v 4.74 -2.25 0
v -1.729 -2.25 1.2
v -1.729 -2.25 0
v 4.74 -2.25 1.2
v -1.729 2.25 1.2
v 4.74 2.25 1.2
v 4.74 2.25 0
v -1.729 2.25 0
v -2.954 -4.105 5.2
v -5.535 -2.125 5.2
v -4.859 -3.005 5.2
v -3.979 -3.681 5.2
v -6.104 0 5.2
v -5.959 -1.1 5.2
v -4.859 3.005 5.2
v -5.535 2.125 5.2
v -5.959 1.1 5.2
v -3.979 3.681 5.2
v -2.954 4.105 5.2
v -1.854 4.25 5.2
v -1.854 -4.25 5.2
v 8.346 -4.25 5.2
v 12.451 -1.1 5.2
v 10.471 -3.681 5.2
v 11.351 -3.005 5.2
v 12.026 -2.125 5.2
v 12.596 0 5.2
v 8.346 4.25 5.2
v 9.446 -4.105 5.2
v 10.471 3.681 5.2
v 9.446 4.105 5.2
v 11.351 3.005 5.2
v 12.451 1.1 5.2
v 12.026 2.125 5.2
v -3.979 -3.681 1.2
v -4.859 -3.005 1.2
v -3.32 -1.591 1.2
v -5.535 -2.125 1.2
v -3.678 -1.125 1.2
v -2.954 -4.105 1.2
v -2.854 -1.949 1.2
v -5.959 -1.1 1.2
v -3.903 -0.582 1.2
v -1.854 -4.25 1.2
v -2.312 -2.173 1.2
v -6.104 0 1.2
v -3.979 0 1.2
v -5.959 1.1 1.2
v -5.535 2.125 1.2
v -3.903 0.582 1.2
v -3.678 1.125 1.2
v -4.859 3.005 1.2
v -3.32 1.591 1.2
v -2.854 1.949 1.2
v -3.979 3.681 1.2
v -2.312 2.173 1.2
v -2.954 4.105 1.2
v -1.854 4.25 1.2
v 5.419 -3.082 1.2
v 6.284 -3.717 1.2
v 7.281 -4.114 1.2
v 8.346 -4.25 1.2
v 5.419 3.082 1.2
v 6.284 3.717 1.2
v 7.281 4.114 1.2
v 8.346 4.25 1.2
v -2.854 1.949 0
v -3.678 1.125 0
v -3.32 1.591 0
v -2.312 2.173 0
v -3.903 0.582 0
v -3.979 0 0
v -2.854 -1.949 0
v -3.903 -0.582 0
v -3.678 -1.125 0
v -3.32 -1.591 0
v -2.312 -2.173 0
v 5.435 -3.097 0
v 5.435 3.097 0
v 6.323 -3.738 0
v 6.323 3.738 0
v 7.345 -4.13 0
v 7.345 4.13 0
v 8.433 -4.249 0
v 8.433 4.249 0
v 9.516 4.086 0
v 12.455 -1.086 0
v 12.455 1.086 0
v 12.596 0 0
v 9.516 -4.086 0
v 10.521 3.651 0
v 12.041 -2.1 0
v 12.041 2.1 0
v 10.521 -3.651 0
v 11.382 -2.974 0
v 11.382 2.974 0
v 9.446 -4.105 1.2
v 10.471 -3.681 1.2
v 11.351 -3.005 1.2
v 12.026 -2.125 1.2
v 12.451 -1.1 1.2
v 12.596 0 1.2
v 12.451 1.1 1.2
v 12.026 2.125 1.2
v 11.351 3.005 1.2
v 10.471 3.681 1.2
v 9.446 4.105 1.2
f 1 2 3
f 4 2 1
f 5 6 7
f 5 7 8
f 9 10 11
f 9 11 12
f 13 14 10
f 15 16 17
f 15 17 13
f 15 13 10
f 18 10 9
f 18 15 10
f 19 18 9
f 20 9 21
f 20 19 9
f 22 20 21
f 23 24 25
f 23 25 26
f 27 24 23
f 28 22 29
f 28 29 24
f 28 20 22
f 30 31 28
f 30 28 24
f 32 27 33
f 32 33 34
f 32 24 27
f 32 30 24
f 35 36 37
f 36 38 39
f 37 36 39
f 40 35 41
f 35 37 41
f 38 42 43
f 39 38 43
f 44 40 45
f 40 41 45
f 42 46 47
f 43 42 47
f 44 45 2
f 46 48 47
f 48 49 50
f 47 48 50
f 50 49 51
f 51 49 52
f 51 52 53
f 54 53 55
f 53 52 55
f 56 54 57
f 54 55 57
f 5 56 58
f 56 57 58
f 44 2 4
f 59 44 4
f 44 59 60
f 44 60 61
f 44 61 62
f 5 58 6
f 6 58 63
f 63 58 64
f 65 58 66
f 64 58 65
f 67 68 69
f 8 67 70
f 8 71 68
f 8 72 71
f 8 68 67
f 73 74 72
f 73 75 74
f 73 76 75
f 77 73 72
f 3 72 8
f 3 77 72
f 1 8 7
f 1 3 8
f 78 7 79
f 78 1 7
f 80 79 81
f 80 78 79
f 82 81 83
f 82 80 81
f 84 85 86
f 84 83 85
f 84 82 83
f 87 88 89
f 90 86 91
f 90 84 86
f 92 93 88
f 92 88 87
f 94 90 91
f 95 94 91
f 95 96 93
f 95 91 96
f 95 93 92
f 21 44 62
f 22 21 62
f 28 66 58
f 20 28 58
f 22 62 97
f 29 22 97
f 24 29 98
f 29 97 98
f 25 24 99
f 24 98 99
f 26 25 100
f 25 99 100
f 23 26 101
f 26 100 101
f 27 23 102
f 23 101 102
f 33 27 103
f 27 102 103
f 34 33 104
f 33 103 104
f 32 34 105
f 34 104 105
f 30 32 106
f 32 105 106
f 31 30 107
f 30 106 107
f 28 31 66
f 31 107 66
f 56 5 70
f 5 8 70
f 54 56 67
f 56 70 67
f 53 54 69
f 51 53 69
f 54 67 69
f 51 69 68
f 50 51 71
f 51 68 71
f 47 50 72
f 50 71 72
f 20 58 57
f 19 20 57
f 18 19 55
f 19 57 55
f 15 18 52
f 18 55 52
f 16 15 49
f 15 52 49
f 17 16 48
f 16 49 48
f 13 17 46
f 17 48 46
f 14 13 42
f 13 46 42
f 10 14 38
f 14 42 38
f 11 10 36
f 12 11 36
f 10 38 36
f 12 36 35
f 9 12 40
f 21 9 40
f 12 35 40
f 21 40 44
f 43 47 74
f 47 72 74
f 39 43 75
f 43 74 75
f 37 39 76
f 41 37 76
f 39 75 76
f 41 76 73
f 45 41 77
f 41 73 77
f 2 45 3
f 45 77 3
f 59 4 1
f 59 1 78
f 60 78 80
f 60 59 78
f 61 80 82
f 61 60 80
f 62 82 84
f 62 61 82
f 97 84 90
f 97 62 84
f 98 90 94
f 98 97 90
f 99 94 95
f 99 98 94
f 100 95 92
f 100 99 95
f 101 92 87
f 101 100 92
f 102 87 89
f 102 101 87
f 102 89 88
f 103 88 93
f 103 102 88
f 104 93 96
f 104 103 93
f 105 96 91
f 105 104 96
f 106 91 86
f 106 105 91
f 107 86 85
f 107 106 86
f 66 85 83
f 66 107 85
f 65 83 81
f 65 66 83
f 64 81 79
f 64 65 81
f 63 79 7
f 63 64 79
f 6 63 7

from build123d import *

# Parameters (mm, degrees)
F6_W      = 19.1
F6_H      = 8.9
F7_DEPTH  = 1.2
F10_DEPTH = 1.2
F11_R     = 2.24999
F12_W     = 19.1
F12_H     = 8.9
F13_DEPTH = 4.2
F14_DEPTH = 4
F15_W     = 19.1
F15_H     = 8.9
F16_DEPTH = 5.2


# Not quite as in the source:
# - a fillet or chamfer is up to 0.001 mm smaller than in the source, because OpenCascade refuses the exact size


with BuildPart() as f7:
    # F6 (on Top) → F7 (new body, through all)
    with BuildSketch(Plane.XY):
        with Locations((3.24578159, 0)):
            Rectangle(F6_W, F6_H)
    extrude(amount=F7_DEPTH)

    # F8 (on face) → F10 (cut, through all)
    with BuildSketch(Plane.XY.offset(1.2)):
        with BuildLine():
            Line((4.7402303145, 2.25), (-3.97921841, 2.25))
            Line((-3.97921841, 2.25), (-3.97921841, -2.25))
            Line((-3.97921841, -2.25), (4.7402303145, -2.25))
            ThreePointArc((4.7402303145, -2.25), (4.09578159, 0), (4.7402303145, 2.25))
        make_face()
        with BuildLine():
            ThreePointArc((12.59578159, 0), (9.5160181215, 4.0857124789), (4.7402303145, 2.25))
            ThreePointArc((4.7402303145, 2.25), (4.09578159, 0), (4.7402303145, -2.25))
            ThreePointArc((4.7402303145, -2.25), (9.5160181215, -4.0857124789), (12.59578159, 0))
        make_face()
    extrude(amount=-F10_DEPTH, mode=Mode.SUBTRACT)

    # F11 (radius 2.25 in the source; OpenCascade refuses exactly that, so slightly less here)
    f11_edges = [f7.edges().sort_by_distance(p)[0] for p in [
        (-3.979218, 2.25, 0.6),
        (-3.979218, -2.25, 0.6),
    ]]
    fillet(f11_edges, radius=F11_R)

    # F12 (on face) → F13 (join)
    with BuildSketch(Plane.XY.offset(1.2)):
        with Locations((3.24578159, 0)):
            Rectangle(F12_W, F12_H)
    extrude(amount=F13_DEPTH)

    # F9 (on offset) → F14 (cut, through all)
    with BuildSketch(Plane.XY.offset(1.2)):
        with BuildLine():
            Line((-1.85421841, -4.25), (8.34578159, -4.25))
            ThreePointArc((8.34578159, -4.25), (12.59578159, 0), (8.34578159, 4.25))
            Line((8.34578159, 4.25), (-1.85421841, 4.25))
            ThreePointArc((-1.85421841, 4.25), (1.15098541, 3.00520382), (2.39578159, 0))
            ThreePointArc((2.39578159, 0), (1.15098541, -3.00520382), (-1.85421841, -4.25))
        make_face()
        with BuildLine():
            ThreePointArc((-1.85421841, 4.25), (-6.10421841, 0), (-1.85421841, -4.25))
            ThreePointArc((-1.85421841, -4.25), (1.15098541, -3.00520382), (2.39578159, 0))
            ThreePointArc((2.39578159, 0), (1.15098541, 3.00520382), (-1.85421841, 4.25))
        make_face()
    extrude(amount=F14_DEPTH, mode=Mode.SUBTRACT)


with BuildPart() as f16:
    # F15 (on face) → F16 (new body, through all)
    with BuildSketch(Plane(origin=(0, 0, 0), x_dir=(1, 0, 0), z_dir=(0, 0, -1))):
        with Locations((3.24578159, 0)):
            Rectangle(F15_W, F15_H)
    extrude(amount=-F16_DEPTH)

    # F17: cut F7
    add(f7.part, mode=Mode.SUBTRACT)


solid = f16.part
